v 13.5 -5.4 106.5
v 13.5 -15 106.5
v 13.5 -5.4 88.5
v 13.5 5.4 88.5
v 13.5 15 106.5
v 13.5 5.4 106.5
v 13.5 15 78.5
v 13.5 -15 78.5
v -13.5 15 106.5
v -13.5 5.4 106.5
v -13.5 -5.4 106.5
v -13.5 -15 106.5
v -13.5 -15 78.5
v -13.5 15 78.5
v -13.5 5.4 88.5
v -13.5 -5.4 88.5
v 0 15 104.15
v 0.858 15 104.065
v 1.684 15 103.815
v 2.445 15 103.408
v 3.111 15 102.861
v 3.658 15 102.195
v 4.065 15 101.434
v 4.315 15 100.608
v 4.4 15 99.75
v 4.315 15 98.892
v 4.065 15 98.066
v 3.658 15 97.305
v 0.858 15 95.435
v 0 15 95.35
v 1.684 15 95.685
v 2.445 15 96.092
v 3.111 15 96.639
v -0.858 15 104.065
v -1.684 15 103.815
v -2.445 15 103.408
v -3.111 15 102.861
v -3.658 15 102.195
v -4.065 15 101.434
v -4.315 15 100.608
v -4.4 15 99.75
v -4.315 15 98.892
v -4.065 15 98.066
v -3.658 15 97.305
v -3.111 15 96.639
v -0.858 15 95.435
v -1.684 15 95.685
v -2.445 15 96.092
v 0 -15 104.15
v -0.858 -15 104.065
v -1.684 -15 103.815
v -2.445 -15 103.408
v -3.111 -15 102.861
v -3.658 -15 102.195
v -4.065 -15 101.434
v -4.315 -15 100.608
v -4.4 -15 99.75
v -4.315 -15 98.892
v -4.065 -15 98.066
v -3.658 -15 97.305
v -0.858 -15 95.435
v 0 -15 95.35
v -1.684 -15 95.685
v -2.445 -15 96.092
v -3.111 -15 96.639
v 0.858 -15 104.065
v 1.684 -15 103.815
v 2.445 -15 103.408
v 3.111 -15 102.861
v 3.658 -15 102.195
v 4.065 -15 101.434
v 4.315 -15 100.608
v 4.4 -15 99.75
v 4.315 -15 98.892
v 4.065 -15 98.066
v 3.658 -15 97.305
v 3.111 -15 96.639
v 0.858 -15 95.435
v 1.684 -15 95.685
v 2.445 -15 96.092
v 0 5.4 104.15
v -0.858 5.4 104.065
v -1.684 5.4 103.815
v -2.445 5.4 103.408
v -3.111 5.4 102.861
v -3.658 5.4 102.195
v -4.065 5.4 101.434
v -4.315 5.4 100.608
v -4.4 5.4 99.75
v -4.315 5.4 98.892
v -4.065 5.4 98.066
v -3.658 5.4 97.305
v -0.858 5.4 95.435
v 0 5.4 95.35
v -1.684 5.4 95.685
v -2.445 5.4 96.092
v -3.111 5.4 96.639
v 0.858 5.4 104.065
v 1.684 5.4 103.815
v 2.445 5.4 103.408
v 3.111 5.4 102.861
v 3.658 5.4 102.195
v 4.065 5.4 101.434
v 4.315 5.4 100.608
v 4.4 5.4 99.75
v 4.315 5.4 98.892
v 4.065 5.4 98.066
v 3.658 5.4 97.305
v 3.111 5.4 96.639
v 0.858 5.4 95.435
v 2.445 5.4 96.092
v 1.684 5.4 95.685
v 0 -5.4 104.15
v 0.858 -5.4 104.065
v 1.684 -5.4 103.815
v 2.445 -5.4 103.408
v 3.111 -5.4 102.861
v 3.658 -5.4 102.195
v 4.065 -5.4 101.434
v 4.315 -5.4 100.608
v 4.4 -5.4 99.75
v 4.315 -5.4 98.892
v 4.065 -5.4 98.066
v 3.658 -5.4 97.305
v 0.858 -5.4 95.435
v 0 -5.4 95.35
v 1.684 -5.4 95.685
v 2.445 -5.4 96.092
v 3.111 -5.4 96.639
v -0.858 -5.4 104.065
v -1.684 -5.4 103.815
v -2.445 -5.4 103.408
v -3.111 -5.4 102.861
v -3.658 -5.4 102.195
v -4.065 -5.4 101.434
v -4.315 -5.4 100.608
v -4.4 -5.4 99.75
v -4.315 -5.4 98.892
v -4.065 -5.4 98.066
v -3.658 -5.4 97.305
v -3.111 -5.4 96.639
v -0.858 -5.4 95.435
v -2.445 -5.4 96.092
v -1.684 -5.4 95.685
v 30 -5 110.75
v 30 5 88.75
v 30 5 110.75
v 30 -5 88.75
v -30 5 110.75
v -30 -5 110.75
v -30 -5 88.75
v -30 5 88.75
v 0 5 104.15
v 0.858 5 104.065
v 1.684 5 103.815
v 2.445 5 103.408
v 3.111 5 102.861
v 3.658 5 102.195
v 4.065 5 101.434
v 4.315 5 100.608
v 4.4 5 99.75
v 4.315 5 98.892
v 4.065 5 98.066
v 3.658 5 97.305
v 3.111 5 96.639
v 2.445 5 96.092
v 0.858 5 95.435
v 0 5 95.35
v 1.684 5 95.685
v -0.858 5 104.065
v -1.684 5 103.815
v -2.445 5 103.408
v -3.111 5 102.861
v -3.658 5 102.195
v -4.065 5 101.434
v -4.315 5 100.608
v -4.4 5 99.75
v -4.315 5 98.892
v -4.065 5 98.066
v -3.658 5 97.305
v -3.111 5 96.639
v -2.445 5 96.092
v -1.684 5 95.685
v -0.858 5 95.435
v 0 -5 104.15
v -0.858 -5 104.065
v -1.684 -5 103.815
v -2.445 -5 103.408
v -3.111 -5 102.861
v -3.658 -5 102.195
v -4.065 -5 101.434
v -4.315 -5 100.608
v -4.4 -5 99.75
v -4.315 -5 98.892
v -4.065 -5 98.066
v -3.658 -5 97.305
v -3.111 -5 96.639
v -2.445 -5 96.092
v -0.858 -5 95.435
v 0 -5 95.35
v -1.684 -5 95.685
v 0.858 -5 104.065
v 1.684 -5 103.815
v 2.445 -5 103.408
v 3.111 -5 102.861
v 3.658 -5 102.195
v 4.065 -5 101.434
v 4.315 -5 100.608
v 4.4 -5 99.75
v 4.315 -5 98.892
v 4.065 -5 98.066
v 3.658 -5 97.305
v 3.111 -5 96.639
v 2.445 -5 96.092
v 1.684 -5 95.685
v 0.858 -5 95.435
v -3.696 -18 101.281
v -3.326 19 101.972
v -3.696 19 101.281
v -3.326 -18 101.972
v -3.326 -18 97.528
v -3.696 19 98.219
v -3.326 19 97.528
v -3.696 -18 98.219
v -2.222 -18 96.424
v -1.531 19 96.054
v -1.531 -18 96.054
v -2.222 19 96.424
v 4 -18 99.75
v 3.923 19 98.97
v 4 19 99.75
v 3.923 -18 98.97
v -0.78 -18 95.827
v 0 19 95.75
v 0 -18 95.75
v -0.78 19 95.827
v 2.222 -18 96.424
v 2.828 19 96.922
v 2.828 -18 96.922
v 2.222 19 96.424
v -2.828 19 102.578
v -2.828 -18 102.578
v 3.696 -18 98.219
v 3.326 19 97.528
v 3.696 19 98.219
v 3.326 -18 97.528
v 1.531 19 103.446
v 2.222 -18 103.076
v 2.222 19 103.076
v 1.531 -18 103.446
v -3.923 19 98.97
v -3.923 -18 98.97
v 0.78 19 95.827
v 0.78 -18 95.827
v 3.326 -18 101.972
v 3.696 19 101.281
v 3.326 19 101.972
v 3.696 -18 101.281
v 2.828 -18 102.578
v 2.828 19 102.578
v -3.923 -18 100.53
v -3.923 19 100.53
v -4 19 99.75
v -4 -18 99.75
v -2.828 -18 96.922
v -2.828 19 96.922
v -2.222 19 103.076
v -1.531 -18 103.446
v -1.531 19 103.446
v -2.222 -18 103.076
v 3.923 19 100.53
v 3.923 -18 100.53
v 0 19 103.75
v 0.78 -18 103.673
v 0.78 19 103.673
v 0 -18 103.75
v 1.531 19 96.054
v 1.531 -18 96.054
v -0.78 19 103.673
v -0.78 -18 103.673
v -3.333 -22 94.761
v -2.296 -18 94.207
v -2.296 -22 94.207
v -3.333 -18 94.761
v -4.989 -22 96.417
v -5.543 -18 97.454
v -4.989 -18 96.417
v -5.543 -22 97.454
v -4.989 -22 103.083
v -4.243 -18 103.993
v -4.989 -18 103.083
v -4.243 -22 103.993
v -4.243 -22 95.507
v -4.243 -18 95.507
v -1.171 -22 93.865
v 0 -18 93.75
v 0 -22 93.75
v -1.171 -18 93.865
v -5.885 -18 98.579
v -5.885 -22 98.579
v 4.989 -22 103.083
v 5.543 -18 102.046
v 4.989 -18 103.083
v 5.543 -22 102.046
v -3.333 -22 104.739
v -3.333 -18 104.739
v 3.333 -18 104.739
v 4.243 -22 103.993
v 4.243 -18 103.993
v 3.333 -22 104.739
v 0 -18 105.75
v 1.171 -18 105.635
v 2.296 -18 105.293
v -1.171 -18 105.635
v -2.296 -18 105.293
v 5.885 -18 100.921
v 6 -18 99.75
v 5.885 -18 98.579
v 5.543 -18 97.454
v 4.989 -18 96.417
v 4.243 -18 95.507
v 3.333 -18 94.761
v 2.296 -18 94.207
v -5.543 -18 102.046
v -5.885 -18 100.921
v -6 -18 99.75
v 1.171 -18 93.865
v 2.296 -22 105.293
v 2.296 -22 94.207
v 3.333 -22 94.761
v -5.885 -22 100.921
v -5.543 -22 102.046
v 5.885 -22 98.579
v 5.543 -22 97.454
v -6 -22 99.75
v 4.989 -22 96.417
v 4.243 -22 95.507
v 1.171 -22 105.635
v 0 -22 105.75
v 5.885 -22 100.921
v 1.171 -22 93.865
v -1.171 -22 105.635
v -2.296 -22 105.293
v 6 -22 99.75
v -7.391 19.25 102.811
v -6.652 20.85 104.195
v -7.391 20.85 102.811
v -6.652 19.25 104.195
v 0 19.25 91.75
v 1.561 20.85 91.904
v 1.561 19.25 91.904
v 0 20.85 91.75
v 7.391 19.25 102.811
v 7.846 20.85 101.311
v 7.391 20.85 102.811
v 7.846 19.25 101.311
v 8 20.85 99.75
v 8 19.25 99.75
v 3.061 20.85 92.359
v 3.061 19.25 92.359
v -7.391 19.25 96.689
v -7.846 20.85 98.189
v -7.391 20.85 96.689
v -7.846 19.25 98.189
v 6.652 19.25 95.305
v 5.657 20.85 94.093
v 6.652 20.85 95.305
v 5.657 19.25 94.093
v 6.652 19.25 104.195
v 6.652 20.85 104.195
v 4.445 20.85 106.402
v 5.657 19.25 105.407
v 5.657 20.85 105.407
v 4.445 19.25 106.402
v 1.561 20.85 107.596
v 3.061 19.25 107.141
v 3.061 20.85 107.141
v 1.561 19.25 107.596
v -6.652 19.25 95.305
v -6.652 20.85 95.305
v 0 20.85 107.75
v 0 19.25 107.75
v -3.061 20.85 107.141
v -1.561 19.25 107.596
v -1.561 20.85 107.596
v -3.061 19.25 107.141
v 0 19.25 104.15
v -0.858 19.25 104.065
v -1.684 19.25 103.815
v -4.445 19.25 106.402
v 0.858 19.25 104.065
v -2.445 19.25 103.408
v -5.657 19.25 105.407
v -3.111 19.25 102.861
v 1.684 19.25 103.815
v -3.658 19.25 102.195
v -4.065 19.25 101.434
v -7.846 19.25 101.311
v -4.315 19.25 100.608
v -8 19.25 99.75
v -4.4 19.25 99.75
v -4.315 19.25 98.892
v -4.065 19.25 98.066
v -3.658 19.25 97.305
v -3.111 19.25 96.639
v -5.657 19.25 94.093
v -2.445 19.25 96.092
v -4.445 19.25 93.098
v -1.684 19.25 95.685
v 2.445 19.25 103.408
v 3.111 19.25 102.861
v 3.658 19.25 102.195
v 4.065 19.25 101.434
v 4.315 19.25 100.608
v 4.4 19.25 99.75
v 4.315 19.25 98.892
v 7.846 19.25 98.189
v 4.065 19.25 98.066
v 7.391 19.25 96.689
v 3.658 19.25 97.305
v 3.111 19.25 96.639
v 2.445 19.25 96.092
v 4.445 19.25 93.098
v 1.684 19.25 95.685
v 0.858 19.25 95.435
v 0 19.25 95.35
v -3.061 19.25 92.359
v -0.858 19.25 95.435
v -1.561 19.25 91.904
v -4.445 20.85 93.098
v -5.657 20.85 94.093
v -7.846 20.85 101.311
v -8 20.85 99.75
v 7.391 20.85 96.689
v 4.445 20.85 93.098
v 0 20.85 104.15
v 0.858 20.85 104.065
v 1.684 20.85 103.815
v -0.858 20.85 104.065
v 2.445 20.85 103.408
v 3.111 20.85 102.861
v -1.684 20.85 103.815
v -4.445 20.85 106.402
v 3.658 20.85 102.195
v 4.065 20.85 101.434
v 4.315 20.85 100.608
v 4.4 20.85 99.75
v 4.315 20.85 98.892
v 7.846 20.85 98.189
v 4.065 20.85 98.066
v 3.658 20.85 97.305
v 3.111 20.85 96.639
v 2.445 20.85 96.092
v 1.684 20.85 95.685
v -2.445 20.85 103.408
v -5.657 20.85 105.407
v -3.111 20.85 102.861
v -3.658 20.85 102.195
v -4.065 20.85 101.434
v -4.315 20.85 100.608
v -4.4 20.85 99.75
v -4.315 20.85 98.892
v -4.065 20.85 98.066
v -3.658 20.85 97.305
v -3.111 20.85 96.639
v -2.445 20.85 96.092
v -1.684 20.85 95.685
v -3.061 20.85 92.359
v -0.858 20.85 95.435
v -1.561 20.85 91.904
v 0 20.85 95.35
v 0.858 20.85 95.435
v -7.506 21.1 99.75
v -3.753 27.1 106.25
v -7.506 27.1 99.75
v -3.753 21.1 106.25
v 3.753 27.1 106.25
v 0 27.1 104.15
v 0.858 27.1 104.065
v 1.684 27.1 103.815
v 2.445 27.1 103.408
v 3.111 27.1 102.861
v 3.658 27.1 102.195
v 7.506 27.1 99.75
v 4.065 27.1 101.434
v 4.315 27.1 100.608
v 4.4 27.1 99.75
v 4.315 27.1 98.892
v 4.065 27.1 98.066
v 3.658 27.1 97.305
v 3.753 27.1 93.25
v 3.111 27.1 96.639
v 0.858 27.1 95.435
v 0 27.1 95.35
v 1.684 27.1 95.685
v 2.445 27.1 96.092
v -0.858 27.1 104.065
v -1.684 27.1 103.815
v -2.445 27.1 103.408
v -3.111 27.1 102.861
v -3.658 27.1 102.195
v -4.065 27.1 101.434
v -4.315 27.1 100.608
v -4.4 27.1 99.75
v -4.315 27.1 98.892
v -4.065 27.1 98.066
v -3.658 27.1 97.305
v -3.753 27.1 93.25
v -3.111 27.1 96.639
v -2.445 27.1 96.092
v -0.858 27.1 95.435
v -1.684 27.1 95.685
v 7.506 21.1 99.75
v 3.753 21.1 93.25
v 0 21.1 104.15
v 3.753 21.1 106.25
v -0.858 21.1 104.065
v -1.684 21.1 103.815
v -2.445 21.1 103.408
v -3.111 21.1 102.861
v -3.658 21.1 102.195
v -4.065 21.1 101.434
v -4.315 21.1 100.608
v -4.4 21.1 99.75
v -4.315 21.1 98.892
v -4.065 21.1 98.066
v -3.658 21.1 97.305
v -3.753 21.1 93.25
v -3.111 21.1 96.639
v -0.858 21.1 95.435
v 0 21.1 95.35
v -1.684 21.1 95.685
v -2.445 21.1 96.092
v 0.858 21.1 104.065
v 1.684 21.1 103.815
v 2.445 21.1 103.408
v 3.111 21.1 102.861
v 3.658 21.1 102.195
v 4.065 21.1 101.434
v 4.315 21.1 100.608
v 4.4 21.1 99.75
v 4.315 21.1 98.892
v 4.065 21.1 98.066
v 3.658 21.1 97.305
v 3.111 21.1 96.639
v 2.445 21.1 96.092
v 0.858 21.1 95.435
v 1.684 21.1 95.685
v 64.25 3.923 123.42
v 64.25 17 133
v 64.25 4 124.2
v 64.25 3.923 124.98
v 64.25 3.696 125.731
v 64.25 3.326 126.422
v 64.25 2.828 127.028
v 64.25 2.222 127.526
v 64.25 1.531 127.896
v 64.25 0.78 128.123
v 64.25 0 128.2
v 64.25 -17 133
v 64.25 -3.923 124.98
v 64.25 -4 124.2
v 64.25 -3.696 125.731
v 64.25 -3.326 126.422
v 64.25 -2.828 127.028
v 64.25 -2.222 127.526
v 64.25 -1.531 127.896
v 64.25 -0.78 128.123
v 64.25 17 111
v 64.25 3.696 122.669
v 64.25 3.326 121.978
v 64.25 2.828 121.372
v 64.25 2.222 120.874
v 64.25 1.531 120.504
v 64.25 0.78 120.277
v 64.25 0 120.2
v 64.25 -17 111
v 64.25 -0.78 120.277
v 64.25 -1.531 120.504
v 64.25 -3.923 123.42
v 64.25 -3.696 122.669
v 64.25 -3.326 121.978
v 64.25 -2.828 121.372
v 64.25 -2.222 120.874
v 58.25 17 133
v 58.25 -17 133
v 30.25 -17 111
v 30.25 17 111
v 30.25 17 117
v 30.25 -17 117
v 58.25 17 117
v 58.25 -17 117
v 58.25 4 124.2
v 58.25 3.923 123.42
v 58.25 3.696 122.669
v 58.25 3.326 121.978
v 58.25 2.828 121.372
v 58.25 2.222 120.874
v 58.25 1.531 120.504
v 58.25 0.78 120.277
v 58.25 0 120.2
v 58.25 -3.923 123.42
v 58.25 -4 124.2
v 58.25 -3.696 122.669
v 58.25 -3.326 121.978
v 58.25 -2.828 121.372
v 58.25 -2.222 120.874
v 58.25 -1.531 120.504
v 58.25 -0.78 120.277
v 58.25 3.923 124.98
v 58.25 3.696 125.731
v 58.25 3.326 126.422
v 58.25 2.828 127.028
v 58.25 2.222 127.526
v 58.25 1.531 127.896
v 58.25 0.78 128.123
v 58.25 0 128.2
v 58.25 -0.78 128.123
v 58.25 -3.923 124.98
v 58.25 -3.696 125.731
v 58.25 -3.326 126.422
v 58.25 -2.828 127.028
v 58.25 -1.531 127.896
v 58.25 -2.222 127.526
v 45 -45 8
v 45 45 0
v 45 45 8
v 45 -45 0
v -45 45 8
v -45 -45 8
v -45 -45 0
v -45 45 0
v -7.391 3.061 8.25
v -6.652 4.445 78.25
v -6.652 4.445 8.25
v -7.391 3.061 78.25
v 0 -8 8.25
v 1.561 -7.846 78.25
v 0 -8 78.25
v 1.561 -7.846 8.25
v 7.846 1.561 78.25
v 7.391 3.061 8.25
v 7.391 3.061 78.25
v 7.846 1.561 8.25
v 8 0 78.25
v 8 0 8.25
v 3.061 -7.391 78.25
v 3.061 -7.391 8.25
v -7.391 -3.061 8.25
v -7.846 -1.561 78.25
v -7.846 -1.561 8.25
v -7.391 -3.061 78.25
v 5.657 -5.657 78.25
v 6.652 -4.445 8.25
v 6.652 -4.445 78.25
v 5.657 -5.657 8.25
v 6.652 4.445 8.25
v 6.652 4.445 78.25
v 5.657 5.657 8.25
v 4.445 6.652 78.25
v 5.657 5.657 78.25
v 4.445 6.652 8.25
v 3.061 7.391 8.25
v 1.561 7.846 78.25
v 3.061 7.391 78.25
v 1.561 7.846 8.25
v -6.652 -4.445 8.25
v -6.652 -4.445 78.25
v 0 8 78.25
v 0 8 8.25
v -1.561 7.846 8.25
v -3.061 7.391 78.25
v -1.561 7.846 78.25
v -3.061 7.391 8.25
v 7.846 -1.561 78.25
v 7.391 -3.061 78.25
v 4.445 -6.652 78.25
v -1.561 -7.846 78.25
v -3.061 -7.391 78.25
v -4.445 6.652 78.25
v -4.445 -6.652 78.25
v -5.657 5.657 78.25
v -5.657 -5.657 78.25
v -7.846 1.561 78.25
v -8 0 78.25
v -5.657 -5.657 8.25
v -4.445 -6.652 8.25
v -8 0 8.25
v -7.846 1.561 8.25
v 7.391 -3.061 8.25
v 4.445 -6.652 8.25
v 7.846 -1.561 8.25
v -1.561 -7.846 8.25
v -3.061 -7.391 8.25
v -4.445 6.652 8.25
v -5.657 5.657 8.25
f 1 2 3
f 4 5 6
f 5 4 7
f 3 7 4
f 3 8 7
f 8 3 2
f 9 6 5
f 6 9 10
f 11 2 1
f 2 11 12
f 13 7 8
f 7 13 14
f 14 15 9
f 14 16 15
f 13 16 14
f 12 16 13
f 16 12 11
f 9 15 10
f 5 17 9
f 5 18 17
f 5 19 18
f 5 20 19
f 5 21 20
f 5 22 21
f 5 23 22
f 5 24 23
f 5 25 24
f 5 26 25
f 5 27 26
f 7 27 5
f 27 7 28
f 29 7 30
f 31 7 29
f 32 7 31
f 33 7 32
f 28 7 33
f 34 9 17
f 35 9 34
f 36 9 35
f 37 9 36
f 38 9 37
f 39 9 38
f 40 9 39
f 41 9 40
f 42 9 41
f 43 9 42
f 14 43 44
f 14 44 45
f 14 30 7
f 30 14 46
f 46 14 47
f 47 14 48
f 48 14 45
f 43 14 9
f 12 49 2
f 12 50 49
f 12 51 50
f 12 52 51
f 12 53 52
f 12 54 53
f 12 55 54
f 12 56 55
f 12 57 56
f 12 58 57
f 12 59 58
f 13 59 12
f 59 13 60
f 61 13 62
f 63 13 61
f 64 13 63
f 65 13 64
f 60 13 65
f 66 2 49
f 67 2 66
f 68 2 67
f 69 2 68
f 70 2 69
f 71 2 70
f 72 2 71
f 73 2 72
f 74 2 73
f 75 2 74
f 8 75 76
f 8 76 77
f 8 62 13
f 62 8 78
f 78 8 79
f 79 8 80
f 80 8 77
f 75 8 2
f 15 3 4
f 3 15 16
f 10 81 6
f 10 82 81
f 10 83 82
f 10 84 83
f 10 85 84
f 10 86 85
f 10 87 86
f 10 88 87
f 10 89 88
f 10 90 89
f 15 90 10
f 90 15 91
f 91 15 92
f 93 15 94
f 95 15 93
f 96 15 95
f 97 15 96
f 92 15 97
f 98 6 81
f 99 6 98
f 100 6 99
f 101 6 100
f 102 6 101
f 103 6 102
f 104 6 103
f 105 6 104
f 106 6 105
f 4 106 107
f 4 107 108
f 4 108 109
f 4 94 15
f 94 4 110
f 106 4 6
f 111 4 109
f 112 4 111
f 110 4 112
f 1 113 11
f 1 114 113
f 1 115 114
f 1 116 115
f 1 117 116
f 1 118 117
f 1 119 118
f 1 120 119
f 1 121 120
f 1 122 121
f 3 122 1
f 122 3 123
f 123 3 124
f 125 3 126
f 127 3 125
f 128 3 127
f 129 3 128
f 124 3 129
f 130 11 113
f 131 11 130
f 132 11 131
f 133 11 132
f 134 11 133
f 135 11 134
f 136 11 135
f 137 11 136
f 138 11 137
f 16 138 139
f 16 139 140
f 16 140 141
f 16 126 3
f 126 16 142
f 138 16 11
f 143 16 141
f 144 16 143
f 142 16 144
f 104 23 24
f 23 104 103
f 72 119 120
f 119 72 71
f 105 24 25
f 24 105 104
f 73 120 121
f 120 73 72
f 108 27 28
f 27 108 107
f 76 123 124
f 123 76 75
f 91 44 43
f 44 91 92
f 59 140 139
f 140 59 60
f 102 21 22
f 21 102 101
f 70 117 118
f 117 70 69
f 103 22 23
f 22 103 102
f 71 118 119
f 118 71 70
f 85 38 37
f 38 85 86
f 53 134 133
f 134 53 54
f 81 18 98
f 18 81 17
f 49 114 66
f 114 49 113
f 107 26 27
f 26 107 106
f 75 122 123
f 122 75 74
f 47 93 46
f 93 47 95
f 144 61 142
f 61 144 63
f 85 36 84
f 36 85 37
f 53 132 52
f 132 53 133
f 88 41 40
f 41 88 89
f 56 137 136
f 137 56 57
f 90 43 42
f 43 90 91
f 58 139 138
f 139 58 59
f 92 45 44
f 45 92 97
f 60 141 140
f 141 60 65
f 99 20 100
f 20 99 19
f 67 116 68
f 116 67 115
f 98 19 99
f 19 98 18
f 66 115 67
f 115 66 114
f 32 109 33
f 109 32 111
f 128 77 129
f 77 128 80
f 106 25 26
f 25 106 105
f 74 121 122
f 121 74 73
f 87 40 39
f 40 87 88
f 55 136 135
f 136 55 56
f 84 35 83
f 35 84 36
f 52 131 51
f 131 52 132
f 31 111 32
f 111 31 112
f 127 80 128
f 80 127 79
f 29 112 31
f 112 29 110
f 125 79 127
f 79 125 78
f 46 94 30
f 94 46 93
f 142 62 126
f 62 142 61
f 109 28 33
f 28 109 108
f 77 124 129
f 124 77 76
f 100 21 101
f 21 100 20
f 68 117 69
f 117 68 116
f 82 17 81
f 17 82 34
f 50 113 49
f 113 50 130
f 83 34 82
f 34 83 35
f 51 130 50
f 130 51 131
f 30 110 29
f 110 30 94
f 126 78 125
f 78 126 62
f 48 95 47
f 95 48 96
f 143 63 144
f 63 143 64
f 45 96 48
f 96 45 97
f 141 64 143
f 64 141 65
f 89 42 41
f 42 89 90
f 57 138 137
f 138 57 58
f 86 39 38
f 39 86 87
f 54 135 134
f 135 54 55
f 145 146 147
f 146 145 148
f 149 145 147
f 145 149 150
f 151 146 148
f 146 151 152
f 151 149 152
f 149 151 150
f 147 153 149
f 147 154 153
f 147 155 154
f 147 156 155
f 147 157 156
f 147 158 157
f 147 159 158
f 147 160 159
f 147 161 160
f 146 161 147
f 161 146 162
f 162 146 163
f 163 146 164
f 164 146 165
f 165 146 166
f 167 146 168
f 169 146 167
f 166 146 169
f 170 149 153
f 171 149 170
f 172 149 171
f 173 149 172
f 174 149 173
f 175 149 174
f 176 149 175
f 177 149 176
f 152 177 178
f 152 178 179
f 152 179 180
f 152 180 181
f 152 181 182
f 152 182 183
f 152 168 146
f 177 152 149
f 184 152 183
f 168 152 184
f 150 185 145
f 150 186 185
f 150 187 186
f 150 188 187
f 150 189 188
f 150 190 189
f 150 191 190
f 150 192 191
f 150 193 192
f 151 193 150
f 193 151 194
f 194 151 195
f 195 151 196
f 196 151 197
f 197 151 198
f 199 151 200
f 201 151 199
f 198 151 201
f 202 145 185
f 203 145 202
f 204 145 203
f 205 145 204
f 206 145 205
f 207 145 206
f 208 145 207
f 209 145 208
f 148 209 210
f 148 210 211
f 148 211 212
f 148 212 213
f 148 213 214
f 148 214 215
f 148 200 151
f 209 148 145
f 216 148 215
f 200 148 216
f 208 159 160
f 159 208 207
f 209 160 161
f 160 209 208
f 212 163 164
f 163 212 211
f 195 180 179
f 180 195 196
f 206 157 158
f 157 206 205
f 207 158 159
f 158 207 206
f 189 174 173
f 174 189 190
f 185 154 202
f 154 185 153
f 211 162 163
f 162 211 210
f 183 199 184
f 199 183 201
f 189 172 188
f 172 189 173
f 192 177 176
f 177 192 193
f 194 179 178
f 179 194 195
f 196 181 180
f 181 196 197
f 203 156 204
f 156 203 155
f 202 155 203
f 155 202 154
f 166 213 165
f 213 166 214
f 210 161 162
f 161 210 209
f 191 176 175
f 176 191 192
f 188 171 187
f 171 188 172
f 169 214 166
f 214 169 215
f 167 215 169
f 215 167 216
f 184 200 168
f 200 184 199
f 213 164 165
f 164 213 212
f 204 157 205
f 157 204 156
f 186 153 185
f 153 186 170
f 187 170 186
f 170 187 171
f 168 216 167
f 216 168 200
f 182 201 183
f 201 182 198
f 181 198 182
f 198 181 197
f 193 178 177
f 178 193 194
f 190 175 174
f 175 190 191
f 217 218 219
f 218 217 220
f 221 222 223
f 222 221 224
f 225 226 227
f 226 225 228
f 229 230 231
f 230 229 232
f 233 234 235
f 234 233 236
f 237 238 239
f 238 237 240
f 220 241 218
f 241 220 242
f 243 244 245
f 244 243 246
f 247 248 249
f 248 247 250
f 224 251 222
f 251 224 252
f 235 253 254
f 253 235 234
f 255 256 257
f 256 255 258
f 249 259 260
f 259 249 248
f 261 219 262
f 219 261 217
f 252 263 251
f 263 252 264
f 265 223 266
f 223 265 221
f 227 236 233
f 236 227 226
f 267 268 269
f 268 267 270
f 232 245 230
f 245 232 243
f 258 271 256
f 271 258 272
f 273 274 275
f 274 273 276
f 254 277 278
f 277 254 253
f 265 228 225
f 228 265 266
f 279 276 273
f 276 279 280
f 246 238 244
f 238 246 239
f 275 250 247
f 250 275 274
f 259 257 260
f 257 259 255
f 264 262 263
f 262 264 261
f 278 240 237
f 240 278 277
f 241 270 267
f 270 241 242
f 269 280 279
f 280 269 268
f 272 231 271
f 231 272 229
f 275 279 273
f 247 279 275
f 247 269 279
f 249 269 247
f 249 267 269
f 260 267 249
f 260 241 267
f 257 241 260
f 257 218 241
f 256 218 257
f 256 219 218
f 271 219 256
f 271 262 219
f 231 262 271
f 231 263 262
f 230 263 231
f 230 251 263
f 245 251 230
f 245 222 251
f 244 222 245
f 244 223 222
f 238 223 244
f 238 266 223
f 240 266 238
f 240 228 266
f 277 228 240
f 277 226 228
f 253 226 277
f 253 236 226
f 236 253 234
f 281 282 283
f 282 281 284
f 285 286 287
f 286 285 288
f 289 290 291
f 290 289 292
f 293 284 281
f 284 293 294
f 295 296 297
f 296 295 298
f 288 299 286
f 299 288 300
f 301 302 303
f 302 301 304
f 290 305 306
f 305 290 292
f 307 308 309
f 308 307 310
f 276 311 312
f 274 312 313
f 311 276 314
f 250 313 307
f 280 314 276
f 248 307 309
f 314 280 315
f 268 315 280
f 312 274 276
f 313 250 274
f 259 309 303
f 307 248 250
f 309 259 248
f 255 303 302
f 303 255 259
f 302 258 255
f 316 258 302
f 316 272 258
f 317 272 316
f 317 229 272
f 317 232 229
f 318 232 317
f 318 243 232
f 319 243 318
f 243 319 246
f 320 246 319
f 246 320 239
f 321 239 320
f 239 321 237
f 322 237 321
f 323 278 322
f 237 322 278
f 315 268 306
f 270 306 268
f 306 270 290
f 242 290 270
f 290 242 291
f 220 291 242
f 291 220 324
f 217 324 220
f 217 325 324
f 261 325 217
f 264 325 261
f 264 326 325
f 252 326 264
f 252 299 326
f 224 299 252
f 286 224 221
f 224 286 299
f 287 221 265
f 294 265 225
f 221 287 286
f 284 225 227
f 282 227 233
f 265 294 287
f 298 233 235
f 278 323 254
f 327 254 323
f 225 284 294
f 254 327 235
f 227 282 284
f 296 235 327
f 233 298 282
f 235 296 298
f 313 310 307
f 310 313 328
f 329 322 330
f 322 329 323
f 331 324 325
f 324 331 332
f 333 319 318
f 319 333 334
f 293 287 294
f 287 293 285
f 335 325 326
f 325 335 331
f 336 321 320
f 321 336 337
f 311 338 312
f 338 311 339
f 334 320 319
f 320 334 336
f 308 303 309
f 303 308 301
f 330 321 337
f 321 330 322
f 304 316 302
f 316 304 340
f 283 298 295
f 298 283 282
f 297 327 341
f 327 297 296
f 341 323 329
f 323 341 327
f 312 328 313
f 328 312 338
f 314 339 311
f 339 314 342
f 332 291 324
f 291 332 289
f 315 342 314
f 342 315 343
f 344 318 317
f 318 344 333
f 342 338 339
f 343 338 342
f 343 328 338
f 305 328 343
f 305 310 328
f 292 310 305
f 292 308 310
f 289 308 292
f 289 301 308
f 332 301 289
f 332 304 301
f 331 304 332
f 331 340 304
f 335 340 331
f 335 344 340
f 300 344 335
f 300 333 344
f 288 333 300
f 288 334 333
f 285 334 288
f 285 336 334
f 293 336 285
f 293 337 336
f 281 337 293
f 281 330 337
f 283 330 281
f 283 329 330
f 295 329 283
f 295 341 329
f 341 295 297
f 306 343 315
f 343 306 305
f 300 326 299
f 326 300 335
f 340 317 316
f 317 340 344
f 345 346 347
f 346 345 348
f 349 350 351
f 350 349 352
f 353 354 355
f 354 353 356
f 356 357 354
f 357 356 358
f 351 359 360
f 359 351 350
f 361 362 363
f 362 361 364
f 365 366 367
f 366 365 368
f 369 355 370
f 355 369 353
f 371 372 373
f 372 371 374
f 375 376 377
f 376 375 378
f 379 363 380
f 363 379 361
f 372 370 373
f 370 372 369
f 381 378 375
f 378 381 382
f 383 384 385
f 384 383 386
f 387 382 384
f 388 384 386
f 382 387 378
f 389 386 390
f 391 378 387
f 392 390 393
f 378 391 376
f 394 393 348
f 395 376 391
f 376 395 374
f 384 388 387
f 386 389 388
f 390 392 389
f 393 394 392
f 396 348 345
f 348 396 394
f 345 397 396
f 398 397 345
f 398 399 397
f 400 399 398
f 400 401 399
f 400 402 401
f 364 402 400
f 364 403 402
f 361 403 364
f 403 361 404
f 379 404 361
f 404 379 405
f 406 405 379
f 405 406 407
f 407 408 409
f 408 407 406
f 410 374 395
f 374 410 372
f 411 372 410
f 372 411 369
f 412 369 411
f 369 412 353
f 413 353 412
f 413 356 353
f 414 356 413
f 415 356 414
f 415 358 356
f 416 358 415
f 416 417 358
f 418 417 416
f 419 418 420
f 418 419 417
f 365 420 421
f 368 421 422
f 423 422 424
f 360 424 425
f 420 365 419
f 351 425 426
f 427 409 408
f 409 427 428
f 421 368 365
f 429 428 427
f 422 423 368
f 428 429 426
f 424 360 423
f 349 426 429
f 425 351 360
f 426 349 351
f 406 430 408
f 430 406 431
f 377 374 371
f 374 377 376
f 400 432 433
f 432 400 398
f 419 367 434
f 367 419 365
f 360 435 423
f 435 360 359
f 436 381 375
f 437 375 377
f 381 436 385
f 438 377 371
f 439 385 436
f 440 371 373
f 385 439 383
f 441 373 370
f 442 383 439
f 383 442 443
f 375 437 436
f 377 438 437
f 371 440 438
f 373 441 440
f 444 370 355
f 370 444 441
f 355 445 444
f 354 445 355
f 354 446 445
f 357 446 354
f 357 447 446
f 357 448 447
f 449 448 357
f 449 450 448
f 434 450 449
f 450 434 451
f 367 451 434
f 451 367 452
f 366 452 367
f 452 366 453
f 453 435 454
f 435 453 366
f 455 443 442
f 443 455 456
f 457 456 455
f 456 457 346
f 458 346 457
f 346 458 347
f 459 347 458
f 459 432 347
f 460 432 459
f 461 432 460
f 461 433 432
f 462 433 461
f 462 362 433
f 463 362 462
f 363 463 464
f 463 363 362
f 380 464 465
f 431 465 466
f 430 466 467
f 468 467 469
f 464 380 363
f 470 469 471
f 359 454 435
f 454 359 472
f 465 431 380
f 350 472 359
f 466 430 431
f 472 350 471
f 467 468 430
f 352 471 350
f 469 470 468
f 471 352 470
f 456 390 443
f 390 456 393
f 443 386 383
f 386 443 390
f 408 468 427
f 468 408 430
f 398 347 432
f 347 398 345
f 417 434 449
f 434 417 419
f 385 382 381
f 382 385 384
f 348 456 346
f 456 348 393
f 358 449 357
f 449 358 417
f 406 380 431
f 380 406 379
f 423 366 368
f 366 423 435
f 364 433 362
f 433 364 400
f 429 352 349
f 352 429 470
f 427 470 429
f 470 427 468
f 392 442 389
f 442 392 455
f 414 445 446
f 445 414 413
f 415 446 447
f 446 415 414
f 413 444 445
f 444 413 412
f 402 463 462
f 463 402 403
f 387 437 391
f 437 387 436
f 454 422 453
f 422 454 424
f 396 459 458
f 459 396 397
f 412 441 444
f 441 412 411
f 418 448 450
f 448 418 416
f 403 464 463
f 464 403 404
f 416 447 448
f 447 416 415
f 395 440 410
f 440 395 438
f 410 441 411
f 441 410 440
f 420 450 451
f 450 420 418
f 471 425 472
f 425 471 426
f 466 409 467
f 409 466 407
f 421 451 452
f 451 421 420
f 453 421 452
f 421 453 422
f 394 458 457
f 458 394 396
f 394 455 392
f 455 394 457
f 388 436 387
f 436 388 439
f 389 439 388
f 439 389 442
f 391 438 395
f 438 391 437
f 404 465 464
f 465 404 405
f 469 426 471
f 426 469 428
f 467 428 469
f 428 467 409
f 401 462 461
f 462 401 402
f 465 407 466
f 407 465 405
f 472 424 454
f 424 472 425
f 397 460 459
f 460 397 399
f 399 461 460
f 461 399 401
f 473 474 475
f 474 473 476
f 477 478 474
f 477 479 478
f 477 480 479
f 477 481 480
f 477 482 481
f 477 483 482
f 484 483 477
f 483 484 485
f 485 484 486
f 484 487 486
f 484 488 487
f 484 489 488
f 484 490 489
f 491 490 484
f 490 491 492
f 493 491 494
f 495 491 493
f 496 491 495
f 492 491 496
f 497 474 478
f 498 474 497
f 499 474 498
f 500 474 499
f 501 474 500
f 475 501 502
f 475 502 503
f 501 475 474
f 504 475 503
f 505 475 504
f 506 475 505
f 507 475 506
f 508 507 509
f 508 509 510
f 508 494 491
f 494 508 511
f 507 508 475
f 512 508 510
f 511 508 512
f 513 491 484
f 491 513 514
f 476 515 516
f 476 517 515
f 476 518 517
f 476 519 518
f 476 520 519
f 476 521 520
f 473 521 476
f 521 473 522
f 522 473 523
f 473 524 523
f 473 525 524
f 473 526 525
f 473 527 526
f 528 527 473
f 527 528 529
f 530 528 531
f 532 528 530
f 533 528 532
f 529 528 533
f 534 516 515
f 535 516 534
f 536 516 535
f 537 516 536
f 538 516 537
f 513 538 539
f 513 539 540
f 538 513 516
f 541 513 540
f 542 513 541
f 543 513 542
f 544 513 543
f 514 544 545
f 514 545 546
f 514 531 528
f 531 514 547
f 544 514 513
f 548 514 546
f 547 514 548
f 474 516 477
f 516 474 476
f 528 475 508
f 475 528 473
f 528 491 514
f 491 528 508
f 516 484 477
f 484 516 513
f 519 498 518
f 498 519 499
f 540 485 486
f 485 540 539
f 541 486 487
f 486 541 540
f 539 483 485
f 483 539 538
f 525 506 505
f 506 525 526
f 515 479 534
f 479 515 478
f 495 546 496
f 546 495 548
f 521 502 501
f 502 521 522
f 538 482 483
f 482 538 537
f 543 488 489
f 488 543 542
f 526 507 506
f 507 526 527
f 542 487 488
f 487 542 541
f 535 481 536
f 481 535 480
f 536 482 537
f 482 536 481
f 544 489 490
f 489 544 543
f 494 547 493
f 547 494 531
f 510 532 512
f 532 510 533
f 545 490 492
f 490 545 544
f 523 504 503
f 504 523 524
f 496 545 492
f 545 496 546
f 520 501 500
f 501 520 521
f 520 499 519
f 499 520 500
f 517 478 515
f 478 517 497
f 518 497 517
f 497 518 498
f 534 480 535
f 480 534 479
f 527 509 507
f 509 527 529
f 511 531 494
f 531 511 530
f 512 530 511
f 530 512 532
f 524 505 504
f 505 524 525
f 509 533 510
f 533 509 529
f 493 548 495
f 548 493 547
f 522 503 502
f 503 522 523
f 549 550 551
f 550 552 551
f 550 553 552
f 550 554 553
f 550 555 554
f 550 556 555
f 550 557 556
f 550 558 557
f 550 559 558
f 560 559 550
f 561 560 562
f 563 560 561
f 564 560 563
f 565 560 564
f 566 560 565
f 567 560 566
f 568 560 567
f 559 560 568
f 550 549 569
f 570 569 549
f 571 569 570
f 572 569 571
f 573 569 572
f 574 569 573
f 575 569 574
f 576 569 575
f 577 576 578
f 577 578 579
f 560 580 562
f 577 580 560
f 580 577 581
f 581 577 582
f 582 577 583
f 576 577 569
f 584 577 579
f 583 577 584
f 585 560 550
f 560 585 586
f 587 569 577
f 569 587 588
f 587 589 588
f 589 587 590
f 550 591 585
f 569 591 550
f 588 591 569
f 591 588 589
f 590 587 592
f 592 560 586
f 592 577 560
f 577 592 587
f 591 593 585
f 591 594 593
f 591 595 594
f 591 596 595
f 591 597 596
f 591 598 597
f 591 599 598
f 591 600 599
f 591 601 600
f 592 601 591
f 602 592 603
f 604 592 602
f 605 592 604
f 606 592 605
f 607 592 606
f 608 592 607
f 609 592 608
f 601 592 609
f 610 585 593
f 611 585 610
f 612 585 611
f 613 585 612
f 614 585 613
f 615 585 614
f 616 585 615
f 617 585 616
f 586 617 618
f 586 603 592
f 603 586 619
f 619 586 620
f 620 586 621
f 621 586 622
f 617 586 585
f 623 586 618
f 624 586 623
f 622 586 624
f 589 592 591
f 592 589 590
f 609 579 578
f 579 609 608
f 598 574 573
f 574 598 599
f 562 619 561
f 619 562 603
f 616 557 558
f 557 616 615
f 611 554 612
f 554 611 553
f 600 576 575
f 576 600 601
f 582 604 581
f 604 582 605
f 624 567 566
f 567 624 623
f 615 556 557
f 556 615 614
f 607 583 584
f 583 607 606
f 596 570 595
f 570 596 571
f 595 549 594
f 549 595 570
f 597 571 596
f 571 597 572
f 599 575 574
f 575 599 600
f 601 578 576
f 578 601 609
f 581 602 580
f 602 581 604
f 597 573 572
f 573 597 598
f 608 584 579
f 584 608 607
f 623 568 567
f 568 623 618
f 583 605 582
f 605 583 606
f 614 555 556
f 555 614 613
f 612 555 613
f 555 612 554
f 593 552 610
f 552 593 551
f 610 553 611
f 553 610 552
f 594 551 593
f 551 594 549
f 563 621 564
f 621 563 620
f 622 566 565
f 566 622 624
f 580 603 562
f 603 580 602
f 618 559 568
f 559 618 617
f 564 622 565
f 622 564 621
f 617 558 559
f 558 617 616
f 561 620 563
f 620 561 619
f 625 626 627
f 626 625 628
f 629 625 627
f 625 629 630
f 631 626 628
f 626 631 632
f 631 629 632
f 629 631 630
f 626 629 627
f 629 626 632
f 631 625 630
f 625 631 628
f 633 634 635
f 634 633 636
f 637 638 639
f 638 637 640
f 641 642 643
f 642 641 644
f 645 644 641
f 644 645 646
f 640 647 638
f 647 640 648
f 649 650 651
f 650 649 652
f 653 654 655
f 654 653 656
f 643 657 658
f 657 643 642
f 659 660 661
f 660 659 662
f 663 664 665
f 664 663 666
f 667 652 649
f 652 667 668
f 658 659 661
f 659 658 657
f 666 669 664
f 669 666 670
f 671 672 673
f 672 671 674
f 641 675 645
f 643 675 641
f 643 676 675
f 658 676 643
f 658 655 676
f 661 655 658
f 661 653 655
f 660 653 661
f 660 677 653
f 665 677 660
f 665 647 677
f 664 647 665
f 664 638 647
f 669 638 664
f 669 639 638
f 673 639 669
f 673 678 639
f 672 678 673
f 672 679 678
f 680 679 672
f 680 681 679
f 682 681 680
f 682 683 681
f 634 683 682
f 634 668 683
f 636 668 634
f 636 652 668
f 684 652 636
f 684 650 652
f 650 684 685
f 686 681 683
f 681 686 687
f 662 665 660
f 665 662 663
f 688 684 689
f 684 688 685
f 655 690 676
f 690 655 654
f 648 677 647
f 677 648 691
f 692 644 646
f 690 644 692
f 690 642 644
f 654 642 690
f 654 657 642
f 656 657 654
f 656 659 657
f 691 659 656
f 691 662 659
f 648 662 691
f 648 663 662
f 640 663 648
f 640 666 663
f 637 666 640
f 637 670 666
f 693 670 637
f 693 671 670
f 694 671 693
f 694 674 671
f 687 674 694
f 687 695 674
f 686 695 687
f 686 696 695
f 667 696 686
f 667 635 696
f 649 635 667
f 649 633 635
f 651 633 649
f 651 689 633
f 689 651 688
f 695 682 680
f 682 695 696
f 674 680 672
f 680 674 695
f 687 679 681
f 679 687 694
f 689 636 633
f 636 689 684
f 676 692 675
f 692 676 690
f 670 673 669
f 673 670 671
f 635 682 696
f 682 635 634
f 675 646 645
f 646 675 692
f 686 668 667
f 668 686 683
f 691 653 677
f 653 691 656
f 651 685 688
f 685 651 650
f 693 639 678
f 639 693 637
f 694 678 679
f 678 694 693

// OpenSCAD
$fn = 32;

// ------------------------------------------------------------------------
// Lamp arm: column d16 x 70 mm, arm 60 mm
// Every part is its own module, assembly() places every instance.
// ------------------------------------------------------------------------

// --- part 1 ---
module lamp_base() {
  difference() {
    translate([-45, -45, 0]) cube([90, 90, 8]);
  }
}

// --- part 2 ---
module lamp_column() {
  cylinder(h = 70, d = 16);
}

// --- part 3 ---
module head_fork() {
  difference() {
    translate([-13.5, -15, 0]) cube([27, 30, 28]);
    translate([-14.5, -5.4, 10]) cube([29, 10.8, 19]);
    translate([0, 0, 21.25]) rotate([90, 0, 0]) cylinder(h = 32, d = 8.8, center = true);
  }
}

// --- part 4 ---
module lamp_arm() {
  difference() {
    translate([-30, -5, 0]) cube([60, 10, 22]);
    translate([0, 0, 11]) rotate([90, 0, 0]) cylinder(h = 12, d = 8.8, center = true);
  }
}

// --- part 5 ---
module arm_pin() {
  rotate([0, 90, 0]) cylinder(h = 38, d = 8, center = true);
  translate([-22, 0, 0]) rotate([0, 90, 0]) cylinder(h = 4, d = 12);
}

// --- part 6 ---
module arm_washer() {
  difference() {
      translate([0, 0, 0]) cylinder(h = 1.6, d = 16);
      translate([0, 0, -1]) cylinder(h = 3.6, d = 8.8);
    }
}

// --- part 7 ---
module arm_nut() {
  difference() {
    linear_extrude(height = 6) polygon(points = [[7.506, 0], [3.753, 6.5], [-3.753, 6.5], [-7.506, 0], [-3.753, -6.5], [3.753, -6.5]]);
    translate([0, 0, -1]) cylinder(h = 8, d = 8.8);
  }
}

// --- part 8 ---
module shade_bracket() {
  difference() {
    translate([-17, -17, 0]) cube([34, 34, 22]);
    translate([-18, -18, 6]) cube([29, 36, 17]);
    translate([14, 0, 13.2]) rotate([0, 90, 0]) cylinder(h = 8, d = 8, center = true);
  }
}

// --- assembly ---
module assembly() {
  color([0.80, 0.24, 0.20]) translate([0, 0, 0]) rotate([0, 0, 0]) lamp_base();
  color([0.20, 0.45, 0.75]) translate([0, 0, 8.25]) rotate([0, 0, 0]) lamp_column();
  color([0.25, 0.62, 0.32]) translate([0, 0, 78.5]) rotate([0, 0, 0]) head_fork();
  color([0.92, 0.70, 0.18]) translate([0, 0, 88.75]) rotate([0, 0, 0]) lamp_arm();
  color([0.58, 0.35, 0.70]) translate([0, 0, 99.75]) rotate([0, 0, 90]) arm_pin();
  color([0.16, 0.66, 0.66]) translate([0, 20.85, 99.75]) rotate([90, 0, 0]) arm_washer();
  color([0.85, 0.48, 0.18]) translate([0, 27.1, 99.75]) rotate([90, 0, 0]) arm_nut();
  color([0.55, 0.60, 0.65]) translate([47.25, 0, 111]) rotate([0, 0, 0]) shade_bracket();
}

assembly();
